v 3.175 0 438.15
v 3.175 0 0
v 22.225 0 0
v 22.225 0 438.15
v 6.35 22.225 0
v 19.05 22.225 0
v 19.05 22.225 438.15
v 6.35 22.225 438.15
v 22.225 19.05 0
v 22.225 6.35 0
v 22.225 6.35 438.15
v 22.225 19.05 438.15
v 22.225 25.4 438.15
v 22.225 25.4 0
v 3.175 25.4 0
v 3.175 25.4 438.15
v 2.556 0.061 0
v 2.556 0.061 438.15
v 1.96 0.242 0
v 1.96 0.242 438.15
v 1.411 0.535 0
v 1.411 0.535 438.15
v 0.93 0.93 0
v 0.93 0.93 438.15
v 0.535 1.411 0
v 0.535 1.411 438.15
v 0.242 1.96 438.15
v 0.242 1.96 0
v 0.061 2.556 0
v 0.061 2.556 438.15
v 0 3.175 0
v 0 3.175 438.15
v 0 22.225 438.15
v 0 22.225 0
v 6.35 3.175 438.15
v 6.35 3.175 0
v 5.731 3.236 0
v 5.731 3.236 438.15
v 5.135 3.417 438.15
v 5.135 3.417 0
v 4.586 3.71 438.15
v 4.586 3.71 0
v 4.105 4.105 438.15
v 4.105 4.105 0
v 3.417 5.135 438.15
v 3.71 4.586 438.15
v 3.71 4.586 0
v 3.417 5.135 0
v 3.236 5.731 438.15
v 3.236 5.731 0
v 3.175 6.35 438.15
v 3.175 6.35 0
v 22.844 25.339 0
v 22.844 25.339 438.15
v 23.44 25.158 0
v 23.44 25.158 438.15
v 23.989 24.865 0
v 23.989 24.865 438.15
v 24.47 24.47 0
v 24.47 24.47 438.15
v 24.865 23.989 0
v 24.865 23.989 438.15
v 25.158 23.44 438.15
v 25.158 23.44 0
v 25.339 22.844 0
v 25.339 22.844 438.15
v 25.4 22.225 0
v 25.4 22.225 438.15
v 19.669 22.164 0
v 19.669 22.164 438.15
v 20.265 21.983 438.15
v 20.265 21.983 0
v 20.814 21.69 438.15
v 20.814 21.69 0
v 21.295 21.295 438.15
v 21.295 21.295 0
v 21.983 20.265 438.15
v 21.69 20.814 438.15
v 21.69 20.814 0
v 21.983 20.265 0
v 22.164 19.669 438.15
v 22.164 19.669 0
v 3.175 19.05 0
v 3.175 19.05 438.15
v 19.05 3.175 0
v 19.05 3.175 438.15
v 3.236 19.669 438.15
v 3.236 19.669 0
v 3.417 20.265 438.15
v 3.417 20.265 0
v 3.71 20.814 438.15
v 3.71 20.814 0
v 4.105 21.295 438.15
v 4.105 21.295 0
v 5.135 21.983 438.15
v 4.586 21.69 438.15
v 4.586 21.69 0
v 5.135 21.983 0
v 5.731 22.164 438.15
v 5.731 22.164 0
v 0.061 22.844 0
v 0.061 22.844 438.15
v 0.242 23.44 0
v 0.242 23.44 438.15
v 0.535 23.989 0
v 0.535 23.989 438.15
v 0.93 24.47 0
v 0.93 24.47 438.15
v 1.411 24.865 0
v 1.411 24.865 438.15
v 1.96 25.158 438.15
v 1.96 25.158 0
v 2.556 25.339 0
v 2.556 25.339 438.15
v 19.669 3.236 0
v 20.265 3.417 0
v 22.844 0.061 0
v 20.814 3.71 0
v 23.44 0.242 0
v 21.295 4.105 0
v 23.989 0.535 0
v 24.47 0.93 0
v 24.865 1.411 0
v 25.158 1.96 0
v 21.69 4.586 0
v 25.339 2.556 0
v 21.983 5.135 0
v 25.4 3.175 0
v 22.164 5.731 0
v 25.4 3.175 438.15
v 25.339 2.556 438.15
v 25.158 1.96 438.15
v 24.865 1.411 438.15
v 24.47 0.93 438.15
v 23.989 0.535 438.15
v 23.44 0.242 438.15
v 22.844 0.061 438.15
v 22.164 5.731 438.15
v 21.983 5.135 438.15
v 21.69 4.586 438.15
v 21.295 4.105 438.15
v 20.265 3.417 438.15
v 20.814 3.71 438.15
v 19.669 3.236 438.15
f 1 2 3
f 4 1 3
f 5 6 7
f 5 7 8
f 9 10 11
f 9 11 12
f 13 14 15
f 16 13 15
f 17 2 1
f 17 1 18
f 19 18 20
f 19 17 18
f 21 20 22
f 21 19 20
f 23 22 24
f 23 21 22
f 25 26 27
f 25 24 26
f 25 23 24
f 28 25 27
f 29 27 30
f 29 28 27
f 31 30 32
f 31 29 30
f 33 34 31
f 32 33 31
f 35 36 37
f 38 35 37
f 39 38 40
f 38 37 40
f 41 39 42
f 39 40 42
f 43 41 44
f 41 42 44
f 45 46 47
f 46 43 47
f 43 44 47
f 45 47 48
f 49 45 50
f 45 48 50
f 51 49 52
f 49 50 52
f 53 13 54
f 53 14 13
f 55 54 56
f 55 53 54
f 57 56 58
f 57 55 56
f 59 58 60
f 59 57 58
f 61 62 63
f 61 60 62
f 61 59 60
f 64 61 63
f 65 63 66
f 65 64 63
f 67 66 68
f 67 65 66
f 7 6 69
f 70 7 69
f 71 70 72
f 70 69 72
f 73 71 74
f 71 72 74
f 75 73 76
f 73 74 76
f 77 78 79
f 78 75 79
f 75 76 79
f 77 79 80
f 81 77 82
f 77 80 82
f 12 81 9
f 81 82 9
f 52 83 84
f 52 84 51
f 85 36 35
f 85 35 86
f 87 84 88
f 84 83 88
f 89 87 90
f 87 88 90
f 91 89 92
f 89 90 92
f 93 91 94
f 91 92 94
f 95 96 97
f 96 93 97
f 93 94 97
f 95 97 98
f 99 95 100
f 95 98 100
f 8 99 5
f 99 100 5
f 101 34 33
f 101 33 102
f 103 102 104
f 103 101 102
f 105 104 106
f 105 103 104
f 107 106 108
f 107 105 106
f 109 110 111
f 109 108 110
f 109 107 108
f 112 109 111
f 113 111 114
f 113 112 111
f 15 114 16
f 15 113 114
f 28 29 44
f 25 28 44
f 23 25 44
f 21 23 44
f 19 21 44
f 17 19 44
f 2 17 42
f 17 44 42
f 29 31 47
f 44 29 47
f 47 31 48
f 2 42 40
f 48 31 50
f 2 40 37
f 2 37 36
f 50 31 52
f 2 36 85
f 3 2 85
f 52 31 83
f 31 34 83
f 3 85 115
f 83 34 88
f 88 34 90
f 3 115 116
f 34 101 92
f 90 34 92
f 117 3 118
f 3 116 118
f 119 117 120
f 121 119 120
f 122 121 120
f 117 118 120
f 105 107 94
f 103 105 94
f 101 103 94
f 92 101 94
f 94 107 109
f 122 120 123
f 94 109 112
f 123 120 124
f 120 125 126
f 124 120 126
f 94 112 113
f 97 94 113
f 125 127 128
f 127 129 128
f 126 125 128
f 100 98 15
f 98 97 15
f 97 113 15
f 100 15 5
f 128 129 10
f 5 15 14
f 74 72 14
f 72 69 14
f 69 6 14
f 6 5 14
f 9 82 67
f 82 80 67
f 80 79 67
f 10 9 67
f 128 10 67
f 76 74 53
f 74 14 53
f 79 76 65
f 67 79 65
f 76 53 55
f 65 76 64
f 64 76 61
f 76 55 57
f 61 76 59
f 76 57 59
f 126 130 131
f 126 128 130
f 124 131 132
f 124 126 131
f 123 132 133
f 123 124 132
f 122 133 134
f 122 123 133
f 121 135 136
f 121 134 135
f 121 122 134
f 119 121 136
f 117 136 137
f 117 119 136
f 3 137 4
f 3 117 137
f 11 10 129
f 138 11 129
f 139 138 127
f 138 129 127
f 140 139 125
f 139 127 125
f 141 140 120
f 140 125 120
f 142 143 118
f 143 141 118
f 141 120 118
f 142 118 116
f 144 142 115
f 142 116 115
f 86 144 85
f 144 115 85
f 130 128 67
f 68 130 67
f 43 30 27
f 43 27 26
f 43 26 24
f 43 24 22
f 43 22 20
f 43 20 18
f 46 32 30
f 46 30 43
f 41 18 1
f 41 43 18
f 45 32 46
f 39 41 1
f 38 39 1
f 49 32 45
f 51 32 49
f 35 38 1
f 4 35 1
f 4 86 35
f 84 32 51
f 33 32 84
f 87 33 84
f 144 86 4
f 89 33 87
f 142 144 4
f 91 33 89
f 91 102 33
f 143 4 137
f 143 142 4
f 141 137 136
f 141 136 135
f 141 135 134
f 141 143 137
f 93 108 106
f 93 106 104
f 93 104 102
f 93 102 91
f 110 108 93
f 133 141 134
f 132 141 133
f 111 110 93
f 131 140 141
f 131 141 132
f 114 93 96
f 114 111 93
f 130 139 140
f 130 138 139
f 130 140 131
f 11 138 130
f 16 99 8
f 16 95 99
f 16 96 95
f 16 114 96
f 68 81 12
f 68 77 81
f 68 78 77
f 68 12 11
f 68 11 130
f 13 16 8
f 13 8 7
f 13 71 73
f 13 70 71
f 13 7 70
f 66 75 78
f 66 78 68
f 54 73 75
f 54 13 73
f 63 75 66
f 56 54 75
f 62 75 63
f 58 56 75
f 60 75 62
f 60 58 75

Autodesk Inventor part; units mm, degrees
ref_plane "YZ Plane" through (0, 0, 0) normal (1, 0, 0) x (0, 1, 0)
ref_plane "XZ Plane" through (0, 0, 0) normal (0, 1, 0) x (-1, 0, 0)
ref_plane "XY Plane" through (0, 0, 0) normal (0, 0, 1) x (1, 0, 0)
sketch "Sketch1" plane through (0, 0, 0) normal (0, 0, 1) x (1, 0, 0)
  line L0 (3.175, 0) -> (22.225, 0)
  line L1 (25.4, 3.175) -> (25.4, 22.225)
  line L2 (22.225, 25.4) -> (3.175, 25.4)
  line L3 (0, 22.225) -> (0, 3.175)
  arc A0 (3.175, 25.4) -> (0, 22.225) centre (3.175, 22.225) ccw
  arc A1 (25.4, 22.225) -> (22.225, 25.4) centre (22.225, 22.225) ccw
  arc A2 (22.225, 0) -> (25.4, 3.175) centre (22.225, 3.175) ccw
  arc A3 (0, 3.175) -> (3.175, 0) centre (3.175, 3.175) ccw
  line L4 (6.35, 3.175) -> (19.05, 3.175)
  line L5 (22.225, 6.35) -> (22.225, 19.05)
  line L6 (19.05, 22.225) -> (6.35, 22.225)
  line L7 (3.175, 19.05) -> (3.175, 6.35)
  arc A4 (6.35, 22.225) -> (3.175, 19.05) centre (6.35, 19.05) ccw
  arc A5 (19.05, 3.175) -> (22.225, 6.35) centre (19.05, 6.35) ccw
  arc A6 (22.225, 19.05) -> (19.05, 22.225) centre (19.05, 19.05) ccw
  arc A7 (3.175, 6.35) -> (6.35, 3.175) centre (6.35, 6.35) ccw
  point P0 (0, 0)
  point P1 (25.4, 25.4)
  point P2 (25.4, 0)
  point P3 (0, 25.4)
  dimension "d0" = 25.4
  dimension "d1" = 25.4
  dimension "d2" = 3.175
  dimension "d3" = 3.175
extrude "Extrusion1" add sketch "Sketch1" along normal blind 438.15
properties part number "FrontHorizTop"
